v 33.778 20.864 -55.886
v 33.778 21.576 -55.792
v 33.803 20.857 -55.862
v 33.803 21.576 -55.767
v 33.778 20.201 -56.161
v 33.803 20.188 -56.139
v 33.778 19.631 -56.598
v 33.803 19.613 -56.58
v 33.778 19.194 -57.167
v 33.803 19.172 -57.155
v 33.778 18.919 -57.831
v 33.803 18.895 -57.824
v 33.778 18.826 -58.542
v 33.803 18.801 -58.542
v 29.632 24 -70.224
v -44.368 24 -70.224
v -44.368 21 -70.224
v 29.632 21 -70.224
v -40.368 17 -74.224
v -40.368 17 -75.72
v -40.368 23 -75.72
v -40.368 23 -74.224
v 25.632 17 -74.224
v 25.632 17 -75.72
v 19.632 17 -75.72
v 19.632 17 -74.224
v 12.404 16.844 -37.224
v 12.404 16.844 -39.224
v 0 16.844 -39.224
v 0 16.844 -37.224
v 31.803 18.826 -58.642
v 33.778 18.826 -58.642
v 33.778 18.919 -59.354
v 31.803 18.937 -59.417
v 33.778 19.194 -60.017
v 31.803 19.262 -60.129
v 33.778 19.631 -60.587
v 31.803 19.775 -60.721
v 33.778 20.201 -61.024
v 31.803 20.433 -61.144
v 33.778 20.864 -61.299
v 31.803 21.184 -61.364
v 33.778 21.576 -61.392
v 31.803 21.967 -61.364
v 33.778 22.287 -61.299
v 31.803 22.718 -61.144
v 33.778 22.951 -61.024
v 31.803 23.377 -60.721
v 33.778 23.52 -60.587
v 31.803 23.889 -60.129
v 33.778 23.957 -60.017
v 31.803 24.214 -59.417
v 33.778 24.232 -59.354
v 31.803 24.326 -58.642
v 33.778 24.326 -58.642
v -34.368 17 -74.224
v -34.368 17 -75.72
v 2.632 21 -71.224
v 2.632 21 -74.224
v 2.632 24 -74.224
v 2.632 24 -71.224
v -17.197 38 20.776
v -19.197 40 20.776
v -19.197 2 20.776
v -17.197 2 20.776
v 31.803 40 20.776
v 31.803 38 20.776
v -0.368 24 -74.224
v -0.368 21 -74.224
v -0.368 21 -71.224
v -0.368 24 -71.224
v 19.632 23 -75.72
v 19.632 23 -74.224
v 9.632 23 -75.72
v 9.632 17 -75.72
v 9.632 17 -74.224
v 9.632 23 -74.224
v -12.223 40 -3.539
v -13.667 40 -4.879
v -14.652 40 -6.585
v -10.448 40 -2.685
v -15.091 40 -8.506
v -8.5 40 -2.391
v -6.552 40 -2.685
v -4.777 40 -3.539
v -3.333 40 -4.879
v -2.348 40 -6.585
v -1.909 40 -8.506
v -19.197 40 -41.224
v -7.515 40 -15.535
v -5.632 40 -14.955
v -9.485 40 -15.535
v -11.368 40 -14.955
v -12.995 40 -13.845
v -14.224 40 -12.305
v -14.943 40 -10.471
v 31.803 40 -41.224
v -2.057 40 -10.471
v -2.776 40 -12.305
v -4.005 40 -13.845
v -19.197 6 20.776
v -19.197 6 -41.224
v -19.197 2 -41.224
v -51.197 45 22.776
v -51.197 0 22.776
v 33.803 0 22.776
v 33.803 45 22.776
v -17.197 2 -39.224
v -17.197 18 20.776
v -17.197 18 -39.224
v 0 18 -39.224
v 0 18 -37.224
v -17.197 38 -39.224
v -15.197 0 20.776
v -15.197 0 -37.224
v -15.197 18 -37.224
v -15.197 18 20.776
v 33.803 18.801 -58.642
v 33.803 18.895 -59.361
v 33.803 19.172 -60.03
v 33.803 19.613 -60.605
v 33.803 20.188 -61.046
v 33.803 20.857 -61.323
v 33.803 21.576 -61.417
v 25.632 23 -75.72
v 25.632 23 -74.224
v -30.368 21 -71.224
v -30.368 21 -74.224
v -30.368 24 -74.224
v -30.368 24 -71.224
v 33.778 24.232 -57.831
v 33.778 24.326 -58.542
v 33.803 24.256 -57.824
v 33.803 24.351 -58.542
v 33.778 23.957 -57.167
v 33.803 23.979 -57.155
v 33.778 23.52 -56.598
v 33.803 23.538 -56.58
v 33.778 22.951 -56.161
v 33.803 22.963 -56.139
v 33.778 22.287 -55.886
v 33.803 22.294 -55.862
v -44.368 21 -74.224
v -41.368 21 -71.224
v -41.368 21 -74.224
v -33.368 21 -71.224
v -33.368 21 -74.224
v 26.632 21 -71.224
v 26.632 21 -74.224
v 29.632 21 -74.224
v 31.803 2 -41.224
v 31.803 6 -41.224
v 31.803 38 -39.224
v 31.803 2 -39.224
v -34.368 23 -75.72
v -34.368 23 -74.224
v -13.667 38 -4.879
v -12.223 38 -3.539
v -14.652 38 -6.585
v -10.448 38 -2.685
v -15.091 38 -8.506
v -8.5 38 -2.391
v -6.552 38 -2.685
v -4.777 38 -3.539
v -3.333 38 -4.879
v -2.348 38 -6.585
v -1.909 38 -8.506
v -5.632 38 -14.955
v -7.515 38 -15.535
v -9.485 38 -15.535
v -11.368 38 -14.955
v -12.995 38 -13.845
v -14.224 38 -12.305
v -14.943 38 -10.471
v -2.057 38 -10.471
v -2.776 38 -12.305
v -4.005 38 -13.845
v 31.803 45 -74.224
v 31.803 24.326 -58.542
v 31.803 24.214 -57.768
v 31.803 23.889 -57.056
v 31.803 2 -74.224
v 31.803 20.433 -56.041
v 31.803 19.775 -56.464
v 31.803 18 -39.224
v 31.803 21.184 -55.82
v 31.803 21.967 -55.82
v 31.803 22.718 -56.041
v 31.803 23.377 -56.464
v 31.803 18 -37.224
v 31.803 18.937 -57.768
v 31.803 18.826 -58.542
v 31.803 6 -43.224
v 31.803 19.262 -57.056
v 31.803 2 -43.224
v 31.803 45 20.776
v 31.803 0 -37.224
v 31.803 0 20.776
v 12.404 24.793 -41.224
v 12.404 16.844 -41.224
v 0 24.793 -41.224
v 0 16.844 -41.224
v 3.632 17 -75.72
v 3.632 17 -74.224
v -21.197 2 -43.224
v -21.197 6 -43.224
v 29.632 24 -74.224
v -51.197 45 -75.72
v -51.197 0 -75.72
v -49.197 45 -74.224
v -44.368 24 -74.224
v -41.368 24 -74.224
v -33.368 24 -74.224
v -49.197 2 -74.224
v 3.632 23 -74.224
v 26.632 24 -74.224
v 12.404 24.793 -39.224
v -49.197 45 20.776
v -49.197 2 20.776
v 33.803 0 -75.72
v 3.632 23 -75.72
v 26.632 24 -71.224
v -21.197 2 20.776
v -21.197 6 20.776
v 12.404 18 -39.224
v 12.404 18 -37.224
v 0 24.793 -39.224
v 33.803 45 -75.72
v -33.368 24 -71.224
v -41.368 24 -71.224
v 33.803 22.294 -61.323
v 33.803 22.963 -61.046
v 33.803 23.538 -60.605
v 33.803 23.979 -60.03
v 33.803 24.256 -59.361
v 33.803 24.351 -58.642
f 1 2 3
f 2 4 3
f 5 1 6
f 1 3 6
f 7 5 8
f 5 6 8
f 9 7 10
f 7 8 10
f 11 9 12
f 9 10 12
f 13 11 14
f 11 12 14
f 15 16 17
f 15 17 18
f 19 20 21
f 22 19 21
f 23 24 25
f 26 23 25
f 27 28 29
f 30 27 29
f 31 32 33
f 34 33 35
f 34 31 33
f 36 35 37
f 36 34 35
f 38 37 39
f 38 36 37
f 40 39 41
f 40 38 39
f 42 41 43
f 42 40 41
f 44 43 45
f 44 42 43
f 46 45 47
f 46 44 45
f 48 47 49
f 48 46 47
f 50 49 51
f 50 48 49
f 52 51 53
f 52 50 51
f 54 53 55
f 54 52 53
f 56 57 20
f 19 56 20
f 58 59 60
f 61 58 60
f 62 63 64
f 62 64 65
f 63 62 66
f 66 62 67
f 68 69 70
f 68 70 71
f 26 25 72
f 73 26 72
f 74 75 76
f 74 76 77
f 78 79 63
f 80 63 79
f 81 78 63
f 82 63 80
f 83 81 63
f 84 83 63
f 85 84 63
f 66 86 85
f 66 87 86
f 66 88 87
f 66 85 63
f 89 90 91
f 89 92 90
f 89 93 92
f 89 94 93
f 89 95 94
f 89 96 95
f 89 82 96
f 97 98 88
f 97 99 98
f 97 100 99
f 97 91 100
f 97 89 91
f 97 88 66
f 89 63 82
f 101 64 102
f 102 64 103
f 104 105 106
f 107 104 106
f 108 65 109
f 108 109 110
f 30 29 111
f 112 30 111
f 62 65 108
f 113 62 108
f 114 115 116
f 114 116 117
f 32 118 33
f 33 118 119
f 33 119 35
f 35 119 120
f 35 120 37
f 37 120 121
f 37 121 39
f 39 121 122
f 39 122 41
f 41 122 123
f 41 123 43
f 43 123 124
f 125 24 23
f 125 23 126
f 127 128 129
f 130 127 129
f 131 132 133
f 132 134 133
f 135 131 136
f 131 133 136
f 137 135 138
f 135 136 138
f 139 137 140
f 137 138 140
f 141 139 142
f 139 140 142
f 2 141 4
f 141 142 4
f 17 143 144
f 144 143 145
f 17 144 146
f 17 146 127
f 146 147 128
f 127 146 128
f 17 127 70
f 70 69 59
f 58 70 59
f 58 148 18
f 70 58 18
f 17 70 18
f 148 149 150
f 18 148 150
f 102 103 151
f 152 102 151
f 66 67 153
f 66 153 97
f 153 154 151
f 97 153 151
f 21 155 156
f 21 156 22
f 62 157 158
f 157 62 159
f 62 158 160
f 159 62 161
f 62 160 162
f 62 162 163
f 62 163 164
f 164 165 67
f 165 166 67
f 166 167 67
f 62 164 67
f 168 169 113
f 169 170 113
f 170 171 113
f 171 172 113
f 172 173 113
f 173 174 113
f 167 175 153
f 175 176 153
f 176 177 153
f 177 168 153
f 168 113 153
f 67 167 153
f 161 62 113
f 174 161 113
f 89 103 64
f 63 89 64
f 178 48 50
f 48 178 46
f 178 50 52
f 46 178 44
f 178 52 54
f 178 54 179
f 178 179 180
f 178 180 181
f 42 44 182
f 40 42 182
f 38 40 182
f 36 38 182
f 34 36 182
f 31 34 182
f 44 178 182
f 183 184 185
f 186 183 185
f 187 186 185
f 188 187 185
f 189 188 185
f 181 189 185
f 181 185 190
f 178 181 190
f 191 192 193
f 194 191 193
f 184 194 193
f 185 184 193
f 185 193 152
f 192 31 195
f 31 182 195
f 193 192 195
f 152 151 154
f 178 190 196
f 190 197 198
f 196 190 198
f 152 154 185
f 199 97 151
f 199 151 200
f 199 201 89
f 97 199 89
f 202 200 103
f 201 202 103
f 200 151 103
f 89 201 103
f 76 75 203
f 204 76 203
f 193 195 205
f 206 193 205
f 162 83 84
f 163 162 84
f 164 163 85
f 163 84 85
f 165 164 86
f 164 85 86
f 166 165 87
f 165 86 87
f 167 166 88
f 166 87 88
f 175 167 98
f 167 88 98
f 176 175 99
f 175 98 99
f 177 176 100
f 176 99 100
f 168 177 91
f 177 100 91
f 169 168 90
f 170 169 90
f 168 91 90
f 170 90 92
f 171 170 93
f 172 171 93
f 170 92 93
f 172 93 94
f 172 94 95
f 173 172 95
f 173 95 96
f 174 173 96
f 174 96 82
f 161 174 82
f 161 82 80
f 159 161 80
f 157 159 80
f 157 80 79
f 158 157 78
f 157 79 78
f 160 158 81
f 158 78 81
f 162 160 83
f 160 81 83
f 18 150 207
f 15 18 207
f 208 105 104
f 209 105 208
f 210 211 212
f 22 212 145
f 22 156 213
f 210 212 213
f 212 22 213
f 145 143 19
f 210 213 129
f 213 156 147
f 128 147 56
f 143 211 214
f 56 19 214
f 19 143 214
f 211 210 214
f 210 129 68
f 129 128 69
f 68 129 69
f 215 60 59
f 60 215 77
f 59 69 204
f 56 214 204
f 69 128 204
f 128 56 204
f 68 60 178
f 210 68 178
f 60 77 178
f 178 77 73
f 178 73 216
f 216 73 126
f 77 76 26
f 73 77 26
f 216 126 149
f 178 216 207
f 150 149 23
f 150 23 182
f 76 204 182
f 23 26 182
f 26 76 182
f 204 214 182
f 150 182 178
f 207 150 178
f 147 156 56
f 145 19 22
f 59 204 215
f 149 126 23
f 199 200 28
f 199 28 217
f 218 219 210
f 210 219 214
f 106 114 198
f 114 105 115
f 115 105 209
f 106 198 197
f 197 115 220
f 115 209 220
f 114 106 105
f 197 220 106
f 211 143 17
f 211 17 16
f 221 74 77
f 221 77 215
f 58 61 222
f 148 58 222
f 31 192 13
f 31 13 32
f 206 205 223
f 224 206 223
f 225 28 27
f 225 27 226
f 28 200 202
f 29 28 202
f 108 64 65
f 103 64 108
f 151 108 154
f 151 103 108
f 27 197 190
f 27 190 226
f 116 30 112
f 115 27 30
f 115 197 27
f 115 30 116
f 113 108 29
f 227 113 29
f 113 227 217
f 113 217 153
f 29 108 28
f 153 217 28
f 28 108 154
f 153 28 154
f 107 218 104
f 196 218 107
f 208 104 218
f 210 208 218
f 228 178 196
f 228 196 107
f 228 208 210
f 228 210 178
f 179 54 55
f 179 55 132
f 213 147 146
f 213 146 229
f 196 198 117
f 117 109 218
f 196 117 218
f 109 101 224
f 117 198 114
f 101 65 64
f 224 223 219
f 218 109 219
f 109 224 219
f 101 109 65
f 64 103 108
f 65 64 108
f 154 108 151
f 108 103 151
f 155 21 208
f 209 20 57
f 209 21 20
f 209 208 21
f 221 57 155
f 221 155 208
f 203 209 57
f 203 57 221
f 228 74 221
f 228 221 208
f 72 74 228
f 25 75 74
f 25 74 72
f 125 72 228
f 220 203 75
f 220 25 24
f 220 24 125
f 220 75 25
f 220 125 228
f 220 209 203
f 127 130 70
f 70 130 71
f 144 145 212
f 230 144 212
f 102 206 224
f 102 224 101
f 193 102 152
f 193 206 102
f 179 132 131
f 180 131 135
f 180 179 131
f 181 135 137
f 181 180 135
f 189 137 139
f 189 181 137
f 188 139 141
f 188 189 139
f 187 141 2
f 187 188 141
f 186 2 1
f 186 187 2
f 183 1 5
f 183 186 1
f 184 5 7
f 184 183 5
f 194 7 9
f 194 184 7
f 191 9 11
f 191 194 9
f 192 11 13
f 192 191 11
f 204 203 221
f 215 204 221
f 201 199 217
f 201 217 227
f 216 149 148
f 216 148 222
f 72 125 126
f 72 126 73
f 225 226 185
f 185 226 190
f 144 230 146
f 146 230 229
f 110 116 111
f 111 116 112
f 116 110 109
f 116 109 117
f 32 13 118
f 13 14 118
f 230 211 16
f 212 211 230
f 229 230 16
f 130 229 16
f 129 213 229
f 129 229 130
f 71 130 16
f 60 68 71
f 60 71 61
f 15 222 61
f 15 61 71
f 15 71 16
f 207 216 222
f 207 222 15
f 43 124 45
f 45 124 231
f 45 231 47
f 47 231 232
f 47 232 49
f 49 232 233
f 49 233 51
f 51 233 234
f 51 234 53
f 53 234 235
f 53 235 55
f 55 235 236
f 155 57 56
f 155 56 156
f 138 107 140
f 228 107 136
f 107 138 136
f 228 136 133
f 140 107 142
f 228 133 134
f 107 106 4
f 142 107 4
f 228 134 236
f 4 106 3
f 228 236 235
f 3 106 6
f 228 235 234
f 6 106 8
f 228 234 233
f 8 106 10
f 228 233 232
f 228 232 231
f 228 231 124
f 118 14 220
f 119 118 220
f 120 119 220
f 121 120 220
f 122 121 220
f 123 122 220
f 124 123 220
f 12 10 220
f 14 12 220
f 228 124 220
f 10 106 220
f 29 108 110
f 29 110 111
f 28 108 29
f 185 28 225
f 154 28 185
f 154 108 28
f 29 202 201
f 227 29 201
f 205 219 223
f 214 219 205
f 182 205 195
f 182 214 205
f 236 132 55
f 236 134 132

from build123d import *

# Parameters (mm, degrees)
SKETCH_1_W                     = 85
SKETCH_1_H                     = 98.49643328
EXTRUDE_1_DEPTH                = 2
SKETCH_1_6_W                   = 2
SKETCH_1_6_H                   = 95
EXTRUDE_2_DEPTH                = 45
SKETCH_1_7_W                   = 54
SKETCH_1_7_H                   = 2
BOSS_EXTRUDE1_DEPTH            = 1
SKETCH13_W                     = 6
SKETCH13_H                     = 6
CUT_EXTRUDE3_DEPTH             = 2
SKETCH15_W                     = 3
SKETCH15_H                     = 3
BOSS_EXTRUDE4_DEPTH            = 4
SKETCH16_W                     = 74
SKETCH16_H                     = 3
BOSS_EXTRUDE6_DEPTH            = 1
SKETCH17_W                     = 47
SKETCH17_H                     = 58
CUT_EXTRUDE4_DEPTH             = 2
BOSS_EXTRUDE7_DEPTH            = 18
SKETCH20_W                     = 2
SKETCH20_H                     = 60
BOSS_EXTRUDE8_DEPTH            = 38
SKETCH22_W                     = 49
SKETCH22_H                     = 60
SKETCH22_R                     = 6.609110004
BOSS_EXTRUDE10_DEPTH           = 2
SKETCH23_W                     = 51
SKETCH23_H                     = 2
BOSS_EXTRUDE11_DEPTH           = 4
SKETCH24_W                     = 12.403634637
SKETCH24_H                     = 7.948897958
CUT_EXTRUDE5_DEPTH             = 4
F_5_5_START                    = 31
F_5_5_5_5_DIAMETER_HOLE2_DEPTH = 4


with BuildPart() as part:
    # ｽｹｯﾁ1 → ﾎﾞｽ - 押し出し1 (new body)
    with BuildSketch(Plane(origin=(0, 0, 0), x_dir=(1, 0, 0), z_dir=(0, 1, 0))):
        with Locations((-8.696743418, 26.472097138)):
            Rectangle(SKETCH_1_W, SKETCH_1_H)
    extrude(amount=EXTRUDE_1_DEPTH)

    # ｽｹｯﾁ1<6> → ﾎﾞｽ - 押し出し2 (add)
    with BuildSketch(Plane(origin=(0, 0, 0), x_dir=(1, 0, 0), z_dir=(0, 1, 0))):
        with Locations((-50.196743418, 26.723880498)):
            Rectangle(SKETCH_1_6_W, SKETCH_1_6_H)
        Polygon((33.803256582, -20.776119502), (31.803256582, -20.776119502), (-22.196743418, -20.776119502), (-24.196743418, -20.776119502), (-49.196743418, -20.776119502), (-51.196743418, -20.776119502), (-51.196743418, -22.776119502), (33.803256582, -22.776119502), align=None)
        Polygon((-22.196743418, 74.223880498), (31.803256582, 74.223880498), (31.803256582, 75.720313778), (-51.196743418, 75.720313778), (-51.196743418, 74.223880498), (-49.196743418, 74.223880498), (-24.196743418, 74.223880498), align=None)
        Polygon((31.803256582, 50.223880498), (31.803256582, 48.223880498), (31.803256582, -20.776119502), (33.803256582, -20.776119502), (33.803256582, 75.720313778), (31.803256582, 75.720313778), (31.803256582, 74.223880498), align=None)
    extrude(amount=EXTRUDE_2_DEPTH)

    # ｽｹｯﾁ1<7> → Boss-Extrude1 (add)
    with BuildSketch(Plane(origin=(0, 0, 0), x_dir=(1, 0, 0), z_dir=(0, 1, 0))):
        with Locations((4.803256582, 49.223880498)):
            Rectangle(SKETCH_1_7_W, SKETCH_1_7_H)
        Polygon((-22.196743418, -20.776119502), (-22.196743418, 48.223880498), (-22.196743418, 50.223880498), (-22.196743418, 74.223880498), (-24.196743418, 74.223880498), (-24.196743418, -20.776119502), align=None)
    extrude(amount=BOSS_EXTRUDE1_DEPTH)

    # Sketch13 → Cut-Extrude3 (cut)
    with BuildSketch(Plane(origin=(0, 0, -75.720313778), x_dir=(-1, 0, 0), z_dir=(0, 0, -1))):
        with Locations((-6.631529016, 20)):
            Rectangle(SKETCH13_W, SKETCH13_H)
        with Locations((-22.631529016, 20)):
            Rectangle(SKETCH13_W, SKETCH13_H)
        with Locations((37.368470984, 20)):
            Rectangle(SKETCH13_W, SKETCH13_H)
    extrude(amount=-CUT_EXTRUDE3_DEPTH, mode=Mode.SUBTRACT)

    # Sketch15 → Boss-Extrude4 (add)
    with BuildSketch(Plane.XY.offset(-74.223880498)):
        with Locations((-42.868470984, 22.5)):
            Rectangle(SKETCH15_W, SKETCH15_H)
        with Locations((28.131529016, 22.5)):
            Rectangle(SKETCH15_W, SKETCH15_H)
        with Locations((-31.868470984, 22.5)):
            Rectangle(SKETCH15_W, SKETCH15_H)
        with Locations((1.131529016, 22.5)):
            Rectangle(SKETCH15_W, SKETCH15_H)
    extrude(amount=BOSS_EXTRUDE4_DEPTH)

    # Sketch16 → Boss-Extrude6 (add)
    with BuildSketch(Plane.XY.offset(-70.223880498)):
        with Locations((-7.368470984, 22.5)):
            Rectangle(SKETCH16_W, SKETCH16_H)
    extrude(amount=-BOSS_EXTRUDE6_DEPTH)

    # Sketch17 → Cut-Extrude4 (cut)
    with BuildSketch(Plane(origin=(0, 2, 0), x_dir=(1, 0, 0), z_dir=(0, 1, 0))):
        with Locations((8.303256582, 8.223880498)):
            Rectangle(SKETCH17_W, SKETCH17_H)
    extrude(amount=-CUT_EXTRUDE4_DEPTH, mode=Mode.SUBTRACT)

    # Sketch19 → Boss-Extrude7 (add)
    with BuildSketch(Plane.XZ):
        Polygon((31.803256582, -37.223880498), (-15.196743418, -37.223880498), (-15.196743418, 20.776119502), (-17.196743418, 20.776119502), (-17.196743418, -39.223880498), (31.803256582, -39.223880498), align=None)
    extrude(amount=-BOSS_EXTRUDE7_DEPTH)


with BuildPart() as body_2:
    # Sketch20 → Boss-Extrude8 (new body)
    with BuildSketch(Plane(origin=(0, 2, 0), x_dir=(1, 0, 0), z_dir=(0, 1, 0))):
        Polygon((-19.196743418, 39.223880498), (-17.196743418, 39.223880498), (31.803256582, 39.223880498), (31.803256582, 41.223880498), (-19.196743418, 41.223880498), align=None)
        with Locations((-18.196743418, 9.223880498)):
            Rectangle(SKETCH20_W, SKETCH20_H)
    extrude(amount=BOSS_EXTRUDE8_DEPTH)


with BuildPart() as body_3:
    # Sketch22 → Boss-Extrude10 (new body)
    with BuildSketch(Plane(origin=(0, 40, 0), x_dir=(1, 0, 0), z_dir=(0, 1, 0))):
        with Locations((7.303256582, 9.223880498)):
            Rectangle(SKETCH22_W, SKETCH22_H)
        with Locations(Location((-8.5, 9, 0), (0, 0, 270))):
            Circle(SKETCH22_R, mode=Mode.SUBTRACT)
    extrude(amount=-BOSS_EXTRUDE10_DEPTH)

    # Combine1: union body 2
    add(body_2.part)


with BuildPart() as body_3_2:
    # Sketch23 → Boss-Extrude11 (new body)
    with BuildSketch(Plane(origin=(0, 2, 0), x_dir=(1, 0, 0), z_dir=(0, 1, 0))):
        with Locations((6.303256582, 42.223880498)):
            Rectangle(SKETCH23_W, SKETCH23_H)
        Polygon((-21.196743418, -20.776119502), (-19.196743418, -20.776119502), (-19.196743418, 41.223880498), (-19.196743418, 43.223880498), (-21.196743418, 43.223880498), align=None)
    extrude(amount=BOSS_EXTRUDE11_DEPTH)

    # Combine2: union part
    add(part.part)


with BuildPart() as cut_extrude5_tool:
    # Sketch24 → Cut-Extrude5 (new body)
    with BuildSketch(Plane(origin=(0, 0, -41.223880498), x_dir=(-1, 0, 0), z_dir=(0, 0, -1))):
        with Locations((-6.201817319, 20.818151846)):
            Rectangle(SKETCH24_W, SKETCH24_H)
    extrude(amount=-CUT_EXTRUDE5_DEPTH)


with BuildPart() as body_3_1:
    add(body_3.part)

    # Cut-Extrude5: cut by cut_extrude5_tool
    add(cut_extrude5_tool.part, mode=Mode.SUBTRACT)


with BuildPart() as body_3_2_1:
    add(body_3_2.part)

    # Cut-Extrude5: cut by cut_extrude5_tool
    add(cut_extrude5_tool.part, mode=Mode.SUBTRACT)

    # Ø5.5 (5.5) Diameter Hole2: read off the stored shape, not the designer's step
    # Ø5.5 (5.5) Diameter Hole2 outline → Ø5.5 (5.5) Diameter Hole2 (cut)
    with BuildSketch(Plane.YZ.offset(F_5_5_START)):
        with BuildLine():
            Line((24.325677948, -58.642288451), (24.325677948, -58.542288451))
            ThreePointArc((24.325677948, -58.542288451), (21.575677948, -55.792288451), (18.825677948, -58.542288451))
            Line((18.825677948, -58.542288451), (18.825677948, -58.642288451))
            ThreePointArc((18.825677948, -58.642288451), (21.575677948, -61.392288451), (24.325677948, -58.642288451))
        make_face()
    extrude(amount=F_5_5_5_5_DIAMETER_HOLE2_DEPTH, mode=Mode.SUBTRACT)

    # 5.5 _5.5_ Diameter Hole2 2: loft between two sections, ruled curve by curve
    f_5_5_5_5_diameter_hole2_2_from = [
        Edge.make_three_point_arc((33.778256582, 24.325677948, -58.542288451), (33.778256582, 23.520221596, -56.597744802), (33.778256582, 21.575677948, -55.792288451)),
        Edge.make_three_point_arc((33.778256582, 21.575677948, -55.792288451), (33.778256582, 19.6311343, -56.597744802), (33.778256582, 18.825677948, -58.542288451)),
        Edge.make_three_point_arc((33.778256582, 18.825677948, -58.642288451), (33.778256582, 19.6311343, -60.586832099), (33.778256582, 21.575677948, -61.392288451)),
        Edge.make_three_point_arc((33.778256582, 21.575677948, -61.392288451), (33.778256582, 23.520221596, -60.586832099), (33.778256582, 24.325677948, -58.642288451)),
        Edge.make_line((33.778256582, 18.825677948, -58.542288451), (33.778256582, 18.825677948, -58.642288451)),
        Edge.make_line((33.778256582, 24.325677948, -58.542288451), (33.778256582, 24.325677948, -58.642288451)),
    ]
    f_5_5_5_5_diameter_hole2_2_to = [
        Edge.make_three_point_arc((33.803256582, 24.350677948, -58.542288451), (33.803256582, 23.537899266, -56.580067133), (33.803256582, 21.575677948, -55.767288451)),
        Edge.make_three_point_arc((33.803256582, 21.575677948, -55.767288451), (33.803256582, 19.61345663, -56.580067133), (33.803256582, 18.800677948, -58.542288451)),
        Edge.make_three_point_arc((33.803256582, 18.800677948, -58.642288451), (33.803256582, 19.61345663, -60.604509769), (33.803256582, 21.575677948, -61.417288451)),
        Edge.make_three_point_arc((33.803256582, 21.575677948, -61.417288451), (33.803256582, 23.537899266, -60.604509769), (33.803256582, 24.350677948, -58.642288451)),
        Edge.make_line((33.803256582, 18.800677948, -58.542288451), (33.803256582, 18.800677948, -58.642288451)),
        Edge.make_line((33.803256582, 24.350677948, -58.542288451), (33.803256582, 24.350677948, -58.642288451)),
    ]
    f_5_5_5_5_diameter_hole2_2 = Solid(Shell([*[Face.make_surface_from_curves(f_5_5_5_5_diameter_hole2_2_from[k], f_5_5_5_5_diameter_hole2_2_to[k]) for k in range(6)], Face(Wire(f_5_5_5_5_diameter_hole2_2_from)), Face(Wire(f_5_5_5_5_diameter_hole2_2_to))]))
    add(f_5_5_5_5_diameter_hole2_2, mode=Mode.SUBTRACT)


solid = Compound([body_3_1.part, body_3_2_1.part])
